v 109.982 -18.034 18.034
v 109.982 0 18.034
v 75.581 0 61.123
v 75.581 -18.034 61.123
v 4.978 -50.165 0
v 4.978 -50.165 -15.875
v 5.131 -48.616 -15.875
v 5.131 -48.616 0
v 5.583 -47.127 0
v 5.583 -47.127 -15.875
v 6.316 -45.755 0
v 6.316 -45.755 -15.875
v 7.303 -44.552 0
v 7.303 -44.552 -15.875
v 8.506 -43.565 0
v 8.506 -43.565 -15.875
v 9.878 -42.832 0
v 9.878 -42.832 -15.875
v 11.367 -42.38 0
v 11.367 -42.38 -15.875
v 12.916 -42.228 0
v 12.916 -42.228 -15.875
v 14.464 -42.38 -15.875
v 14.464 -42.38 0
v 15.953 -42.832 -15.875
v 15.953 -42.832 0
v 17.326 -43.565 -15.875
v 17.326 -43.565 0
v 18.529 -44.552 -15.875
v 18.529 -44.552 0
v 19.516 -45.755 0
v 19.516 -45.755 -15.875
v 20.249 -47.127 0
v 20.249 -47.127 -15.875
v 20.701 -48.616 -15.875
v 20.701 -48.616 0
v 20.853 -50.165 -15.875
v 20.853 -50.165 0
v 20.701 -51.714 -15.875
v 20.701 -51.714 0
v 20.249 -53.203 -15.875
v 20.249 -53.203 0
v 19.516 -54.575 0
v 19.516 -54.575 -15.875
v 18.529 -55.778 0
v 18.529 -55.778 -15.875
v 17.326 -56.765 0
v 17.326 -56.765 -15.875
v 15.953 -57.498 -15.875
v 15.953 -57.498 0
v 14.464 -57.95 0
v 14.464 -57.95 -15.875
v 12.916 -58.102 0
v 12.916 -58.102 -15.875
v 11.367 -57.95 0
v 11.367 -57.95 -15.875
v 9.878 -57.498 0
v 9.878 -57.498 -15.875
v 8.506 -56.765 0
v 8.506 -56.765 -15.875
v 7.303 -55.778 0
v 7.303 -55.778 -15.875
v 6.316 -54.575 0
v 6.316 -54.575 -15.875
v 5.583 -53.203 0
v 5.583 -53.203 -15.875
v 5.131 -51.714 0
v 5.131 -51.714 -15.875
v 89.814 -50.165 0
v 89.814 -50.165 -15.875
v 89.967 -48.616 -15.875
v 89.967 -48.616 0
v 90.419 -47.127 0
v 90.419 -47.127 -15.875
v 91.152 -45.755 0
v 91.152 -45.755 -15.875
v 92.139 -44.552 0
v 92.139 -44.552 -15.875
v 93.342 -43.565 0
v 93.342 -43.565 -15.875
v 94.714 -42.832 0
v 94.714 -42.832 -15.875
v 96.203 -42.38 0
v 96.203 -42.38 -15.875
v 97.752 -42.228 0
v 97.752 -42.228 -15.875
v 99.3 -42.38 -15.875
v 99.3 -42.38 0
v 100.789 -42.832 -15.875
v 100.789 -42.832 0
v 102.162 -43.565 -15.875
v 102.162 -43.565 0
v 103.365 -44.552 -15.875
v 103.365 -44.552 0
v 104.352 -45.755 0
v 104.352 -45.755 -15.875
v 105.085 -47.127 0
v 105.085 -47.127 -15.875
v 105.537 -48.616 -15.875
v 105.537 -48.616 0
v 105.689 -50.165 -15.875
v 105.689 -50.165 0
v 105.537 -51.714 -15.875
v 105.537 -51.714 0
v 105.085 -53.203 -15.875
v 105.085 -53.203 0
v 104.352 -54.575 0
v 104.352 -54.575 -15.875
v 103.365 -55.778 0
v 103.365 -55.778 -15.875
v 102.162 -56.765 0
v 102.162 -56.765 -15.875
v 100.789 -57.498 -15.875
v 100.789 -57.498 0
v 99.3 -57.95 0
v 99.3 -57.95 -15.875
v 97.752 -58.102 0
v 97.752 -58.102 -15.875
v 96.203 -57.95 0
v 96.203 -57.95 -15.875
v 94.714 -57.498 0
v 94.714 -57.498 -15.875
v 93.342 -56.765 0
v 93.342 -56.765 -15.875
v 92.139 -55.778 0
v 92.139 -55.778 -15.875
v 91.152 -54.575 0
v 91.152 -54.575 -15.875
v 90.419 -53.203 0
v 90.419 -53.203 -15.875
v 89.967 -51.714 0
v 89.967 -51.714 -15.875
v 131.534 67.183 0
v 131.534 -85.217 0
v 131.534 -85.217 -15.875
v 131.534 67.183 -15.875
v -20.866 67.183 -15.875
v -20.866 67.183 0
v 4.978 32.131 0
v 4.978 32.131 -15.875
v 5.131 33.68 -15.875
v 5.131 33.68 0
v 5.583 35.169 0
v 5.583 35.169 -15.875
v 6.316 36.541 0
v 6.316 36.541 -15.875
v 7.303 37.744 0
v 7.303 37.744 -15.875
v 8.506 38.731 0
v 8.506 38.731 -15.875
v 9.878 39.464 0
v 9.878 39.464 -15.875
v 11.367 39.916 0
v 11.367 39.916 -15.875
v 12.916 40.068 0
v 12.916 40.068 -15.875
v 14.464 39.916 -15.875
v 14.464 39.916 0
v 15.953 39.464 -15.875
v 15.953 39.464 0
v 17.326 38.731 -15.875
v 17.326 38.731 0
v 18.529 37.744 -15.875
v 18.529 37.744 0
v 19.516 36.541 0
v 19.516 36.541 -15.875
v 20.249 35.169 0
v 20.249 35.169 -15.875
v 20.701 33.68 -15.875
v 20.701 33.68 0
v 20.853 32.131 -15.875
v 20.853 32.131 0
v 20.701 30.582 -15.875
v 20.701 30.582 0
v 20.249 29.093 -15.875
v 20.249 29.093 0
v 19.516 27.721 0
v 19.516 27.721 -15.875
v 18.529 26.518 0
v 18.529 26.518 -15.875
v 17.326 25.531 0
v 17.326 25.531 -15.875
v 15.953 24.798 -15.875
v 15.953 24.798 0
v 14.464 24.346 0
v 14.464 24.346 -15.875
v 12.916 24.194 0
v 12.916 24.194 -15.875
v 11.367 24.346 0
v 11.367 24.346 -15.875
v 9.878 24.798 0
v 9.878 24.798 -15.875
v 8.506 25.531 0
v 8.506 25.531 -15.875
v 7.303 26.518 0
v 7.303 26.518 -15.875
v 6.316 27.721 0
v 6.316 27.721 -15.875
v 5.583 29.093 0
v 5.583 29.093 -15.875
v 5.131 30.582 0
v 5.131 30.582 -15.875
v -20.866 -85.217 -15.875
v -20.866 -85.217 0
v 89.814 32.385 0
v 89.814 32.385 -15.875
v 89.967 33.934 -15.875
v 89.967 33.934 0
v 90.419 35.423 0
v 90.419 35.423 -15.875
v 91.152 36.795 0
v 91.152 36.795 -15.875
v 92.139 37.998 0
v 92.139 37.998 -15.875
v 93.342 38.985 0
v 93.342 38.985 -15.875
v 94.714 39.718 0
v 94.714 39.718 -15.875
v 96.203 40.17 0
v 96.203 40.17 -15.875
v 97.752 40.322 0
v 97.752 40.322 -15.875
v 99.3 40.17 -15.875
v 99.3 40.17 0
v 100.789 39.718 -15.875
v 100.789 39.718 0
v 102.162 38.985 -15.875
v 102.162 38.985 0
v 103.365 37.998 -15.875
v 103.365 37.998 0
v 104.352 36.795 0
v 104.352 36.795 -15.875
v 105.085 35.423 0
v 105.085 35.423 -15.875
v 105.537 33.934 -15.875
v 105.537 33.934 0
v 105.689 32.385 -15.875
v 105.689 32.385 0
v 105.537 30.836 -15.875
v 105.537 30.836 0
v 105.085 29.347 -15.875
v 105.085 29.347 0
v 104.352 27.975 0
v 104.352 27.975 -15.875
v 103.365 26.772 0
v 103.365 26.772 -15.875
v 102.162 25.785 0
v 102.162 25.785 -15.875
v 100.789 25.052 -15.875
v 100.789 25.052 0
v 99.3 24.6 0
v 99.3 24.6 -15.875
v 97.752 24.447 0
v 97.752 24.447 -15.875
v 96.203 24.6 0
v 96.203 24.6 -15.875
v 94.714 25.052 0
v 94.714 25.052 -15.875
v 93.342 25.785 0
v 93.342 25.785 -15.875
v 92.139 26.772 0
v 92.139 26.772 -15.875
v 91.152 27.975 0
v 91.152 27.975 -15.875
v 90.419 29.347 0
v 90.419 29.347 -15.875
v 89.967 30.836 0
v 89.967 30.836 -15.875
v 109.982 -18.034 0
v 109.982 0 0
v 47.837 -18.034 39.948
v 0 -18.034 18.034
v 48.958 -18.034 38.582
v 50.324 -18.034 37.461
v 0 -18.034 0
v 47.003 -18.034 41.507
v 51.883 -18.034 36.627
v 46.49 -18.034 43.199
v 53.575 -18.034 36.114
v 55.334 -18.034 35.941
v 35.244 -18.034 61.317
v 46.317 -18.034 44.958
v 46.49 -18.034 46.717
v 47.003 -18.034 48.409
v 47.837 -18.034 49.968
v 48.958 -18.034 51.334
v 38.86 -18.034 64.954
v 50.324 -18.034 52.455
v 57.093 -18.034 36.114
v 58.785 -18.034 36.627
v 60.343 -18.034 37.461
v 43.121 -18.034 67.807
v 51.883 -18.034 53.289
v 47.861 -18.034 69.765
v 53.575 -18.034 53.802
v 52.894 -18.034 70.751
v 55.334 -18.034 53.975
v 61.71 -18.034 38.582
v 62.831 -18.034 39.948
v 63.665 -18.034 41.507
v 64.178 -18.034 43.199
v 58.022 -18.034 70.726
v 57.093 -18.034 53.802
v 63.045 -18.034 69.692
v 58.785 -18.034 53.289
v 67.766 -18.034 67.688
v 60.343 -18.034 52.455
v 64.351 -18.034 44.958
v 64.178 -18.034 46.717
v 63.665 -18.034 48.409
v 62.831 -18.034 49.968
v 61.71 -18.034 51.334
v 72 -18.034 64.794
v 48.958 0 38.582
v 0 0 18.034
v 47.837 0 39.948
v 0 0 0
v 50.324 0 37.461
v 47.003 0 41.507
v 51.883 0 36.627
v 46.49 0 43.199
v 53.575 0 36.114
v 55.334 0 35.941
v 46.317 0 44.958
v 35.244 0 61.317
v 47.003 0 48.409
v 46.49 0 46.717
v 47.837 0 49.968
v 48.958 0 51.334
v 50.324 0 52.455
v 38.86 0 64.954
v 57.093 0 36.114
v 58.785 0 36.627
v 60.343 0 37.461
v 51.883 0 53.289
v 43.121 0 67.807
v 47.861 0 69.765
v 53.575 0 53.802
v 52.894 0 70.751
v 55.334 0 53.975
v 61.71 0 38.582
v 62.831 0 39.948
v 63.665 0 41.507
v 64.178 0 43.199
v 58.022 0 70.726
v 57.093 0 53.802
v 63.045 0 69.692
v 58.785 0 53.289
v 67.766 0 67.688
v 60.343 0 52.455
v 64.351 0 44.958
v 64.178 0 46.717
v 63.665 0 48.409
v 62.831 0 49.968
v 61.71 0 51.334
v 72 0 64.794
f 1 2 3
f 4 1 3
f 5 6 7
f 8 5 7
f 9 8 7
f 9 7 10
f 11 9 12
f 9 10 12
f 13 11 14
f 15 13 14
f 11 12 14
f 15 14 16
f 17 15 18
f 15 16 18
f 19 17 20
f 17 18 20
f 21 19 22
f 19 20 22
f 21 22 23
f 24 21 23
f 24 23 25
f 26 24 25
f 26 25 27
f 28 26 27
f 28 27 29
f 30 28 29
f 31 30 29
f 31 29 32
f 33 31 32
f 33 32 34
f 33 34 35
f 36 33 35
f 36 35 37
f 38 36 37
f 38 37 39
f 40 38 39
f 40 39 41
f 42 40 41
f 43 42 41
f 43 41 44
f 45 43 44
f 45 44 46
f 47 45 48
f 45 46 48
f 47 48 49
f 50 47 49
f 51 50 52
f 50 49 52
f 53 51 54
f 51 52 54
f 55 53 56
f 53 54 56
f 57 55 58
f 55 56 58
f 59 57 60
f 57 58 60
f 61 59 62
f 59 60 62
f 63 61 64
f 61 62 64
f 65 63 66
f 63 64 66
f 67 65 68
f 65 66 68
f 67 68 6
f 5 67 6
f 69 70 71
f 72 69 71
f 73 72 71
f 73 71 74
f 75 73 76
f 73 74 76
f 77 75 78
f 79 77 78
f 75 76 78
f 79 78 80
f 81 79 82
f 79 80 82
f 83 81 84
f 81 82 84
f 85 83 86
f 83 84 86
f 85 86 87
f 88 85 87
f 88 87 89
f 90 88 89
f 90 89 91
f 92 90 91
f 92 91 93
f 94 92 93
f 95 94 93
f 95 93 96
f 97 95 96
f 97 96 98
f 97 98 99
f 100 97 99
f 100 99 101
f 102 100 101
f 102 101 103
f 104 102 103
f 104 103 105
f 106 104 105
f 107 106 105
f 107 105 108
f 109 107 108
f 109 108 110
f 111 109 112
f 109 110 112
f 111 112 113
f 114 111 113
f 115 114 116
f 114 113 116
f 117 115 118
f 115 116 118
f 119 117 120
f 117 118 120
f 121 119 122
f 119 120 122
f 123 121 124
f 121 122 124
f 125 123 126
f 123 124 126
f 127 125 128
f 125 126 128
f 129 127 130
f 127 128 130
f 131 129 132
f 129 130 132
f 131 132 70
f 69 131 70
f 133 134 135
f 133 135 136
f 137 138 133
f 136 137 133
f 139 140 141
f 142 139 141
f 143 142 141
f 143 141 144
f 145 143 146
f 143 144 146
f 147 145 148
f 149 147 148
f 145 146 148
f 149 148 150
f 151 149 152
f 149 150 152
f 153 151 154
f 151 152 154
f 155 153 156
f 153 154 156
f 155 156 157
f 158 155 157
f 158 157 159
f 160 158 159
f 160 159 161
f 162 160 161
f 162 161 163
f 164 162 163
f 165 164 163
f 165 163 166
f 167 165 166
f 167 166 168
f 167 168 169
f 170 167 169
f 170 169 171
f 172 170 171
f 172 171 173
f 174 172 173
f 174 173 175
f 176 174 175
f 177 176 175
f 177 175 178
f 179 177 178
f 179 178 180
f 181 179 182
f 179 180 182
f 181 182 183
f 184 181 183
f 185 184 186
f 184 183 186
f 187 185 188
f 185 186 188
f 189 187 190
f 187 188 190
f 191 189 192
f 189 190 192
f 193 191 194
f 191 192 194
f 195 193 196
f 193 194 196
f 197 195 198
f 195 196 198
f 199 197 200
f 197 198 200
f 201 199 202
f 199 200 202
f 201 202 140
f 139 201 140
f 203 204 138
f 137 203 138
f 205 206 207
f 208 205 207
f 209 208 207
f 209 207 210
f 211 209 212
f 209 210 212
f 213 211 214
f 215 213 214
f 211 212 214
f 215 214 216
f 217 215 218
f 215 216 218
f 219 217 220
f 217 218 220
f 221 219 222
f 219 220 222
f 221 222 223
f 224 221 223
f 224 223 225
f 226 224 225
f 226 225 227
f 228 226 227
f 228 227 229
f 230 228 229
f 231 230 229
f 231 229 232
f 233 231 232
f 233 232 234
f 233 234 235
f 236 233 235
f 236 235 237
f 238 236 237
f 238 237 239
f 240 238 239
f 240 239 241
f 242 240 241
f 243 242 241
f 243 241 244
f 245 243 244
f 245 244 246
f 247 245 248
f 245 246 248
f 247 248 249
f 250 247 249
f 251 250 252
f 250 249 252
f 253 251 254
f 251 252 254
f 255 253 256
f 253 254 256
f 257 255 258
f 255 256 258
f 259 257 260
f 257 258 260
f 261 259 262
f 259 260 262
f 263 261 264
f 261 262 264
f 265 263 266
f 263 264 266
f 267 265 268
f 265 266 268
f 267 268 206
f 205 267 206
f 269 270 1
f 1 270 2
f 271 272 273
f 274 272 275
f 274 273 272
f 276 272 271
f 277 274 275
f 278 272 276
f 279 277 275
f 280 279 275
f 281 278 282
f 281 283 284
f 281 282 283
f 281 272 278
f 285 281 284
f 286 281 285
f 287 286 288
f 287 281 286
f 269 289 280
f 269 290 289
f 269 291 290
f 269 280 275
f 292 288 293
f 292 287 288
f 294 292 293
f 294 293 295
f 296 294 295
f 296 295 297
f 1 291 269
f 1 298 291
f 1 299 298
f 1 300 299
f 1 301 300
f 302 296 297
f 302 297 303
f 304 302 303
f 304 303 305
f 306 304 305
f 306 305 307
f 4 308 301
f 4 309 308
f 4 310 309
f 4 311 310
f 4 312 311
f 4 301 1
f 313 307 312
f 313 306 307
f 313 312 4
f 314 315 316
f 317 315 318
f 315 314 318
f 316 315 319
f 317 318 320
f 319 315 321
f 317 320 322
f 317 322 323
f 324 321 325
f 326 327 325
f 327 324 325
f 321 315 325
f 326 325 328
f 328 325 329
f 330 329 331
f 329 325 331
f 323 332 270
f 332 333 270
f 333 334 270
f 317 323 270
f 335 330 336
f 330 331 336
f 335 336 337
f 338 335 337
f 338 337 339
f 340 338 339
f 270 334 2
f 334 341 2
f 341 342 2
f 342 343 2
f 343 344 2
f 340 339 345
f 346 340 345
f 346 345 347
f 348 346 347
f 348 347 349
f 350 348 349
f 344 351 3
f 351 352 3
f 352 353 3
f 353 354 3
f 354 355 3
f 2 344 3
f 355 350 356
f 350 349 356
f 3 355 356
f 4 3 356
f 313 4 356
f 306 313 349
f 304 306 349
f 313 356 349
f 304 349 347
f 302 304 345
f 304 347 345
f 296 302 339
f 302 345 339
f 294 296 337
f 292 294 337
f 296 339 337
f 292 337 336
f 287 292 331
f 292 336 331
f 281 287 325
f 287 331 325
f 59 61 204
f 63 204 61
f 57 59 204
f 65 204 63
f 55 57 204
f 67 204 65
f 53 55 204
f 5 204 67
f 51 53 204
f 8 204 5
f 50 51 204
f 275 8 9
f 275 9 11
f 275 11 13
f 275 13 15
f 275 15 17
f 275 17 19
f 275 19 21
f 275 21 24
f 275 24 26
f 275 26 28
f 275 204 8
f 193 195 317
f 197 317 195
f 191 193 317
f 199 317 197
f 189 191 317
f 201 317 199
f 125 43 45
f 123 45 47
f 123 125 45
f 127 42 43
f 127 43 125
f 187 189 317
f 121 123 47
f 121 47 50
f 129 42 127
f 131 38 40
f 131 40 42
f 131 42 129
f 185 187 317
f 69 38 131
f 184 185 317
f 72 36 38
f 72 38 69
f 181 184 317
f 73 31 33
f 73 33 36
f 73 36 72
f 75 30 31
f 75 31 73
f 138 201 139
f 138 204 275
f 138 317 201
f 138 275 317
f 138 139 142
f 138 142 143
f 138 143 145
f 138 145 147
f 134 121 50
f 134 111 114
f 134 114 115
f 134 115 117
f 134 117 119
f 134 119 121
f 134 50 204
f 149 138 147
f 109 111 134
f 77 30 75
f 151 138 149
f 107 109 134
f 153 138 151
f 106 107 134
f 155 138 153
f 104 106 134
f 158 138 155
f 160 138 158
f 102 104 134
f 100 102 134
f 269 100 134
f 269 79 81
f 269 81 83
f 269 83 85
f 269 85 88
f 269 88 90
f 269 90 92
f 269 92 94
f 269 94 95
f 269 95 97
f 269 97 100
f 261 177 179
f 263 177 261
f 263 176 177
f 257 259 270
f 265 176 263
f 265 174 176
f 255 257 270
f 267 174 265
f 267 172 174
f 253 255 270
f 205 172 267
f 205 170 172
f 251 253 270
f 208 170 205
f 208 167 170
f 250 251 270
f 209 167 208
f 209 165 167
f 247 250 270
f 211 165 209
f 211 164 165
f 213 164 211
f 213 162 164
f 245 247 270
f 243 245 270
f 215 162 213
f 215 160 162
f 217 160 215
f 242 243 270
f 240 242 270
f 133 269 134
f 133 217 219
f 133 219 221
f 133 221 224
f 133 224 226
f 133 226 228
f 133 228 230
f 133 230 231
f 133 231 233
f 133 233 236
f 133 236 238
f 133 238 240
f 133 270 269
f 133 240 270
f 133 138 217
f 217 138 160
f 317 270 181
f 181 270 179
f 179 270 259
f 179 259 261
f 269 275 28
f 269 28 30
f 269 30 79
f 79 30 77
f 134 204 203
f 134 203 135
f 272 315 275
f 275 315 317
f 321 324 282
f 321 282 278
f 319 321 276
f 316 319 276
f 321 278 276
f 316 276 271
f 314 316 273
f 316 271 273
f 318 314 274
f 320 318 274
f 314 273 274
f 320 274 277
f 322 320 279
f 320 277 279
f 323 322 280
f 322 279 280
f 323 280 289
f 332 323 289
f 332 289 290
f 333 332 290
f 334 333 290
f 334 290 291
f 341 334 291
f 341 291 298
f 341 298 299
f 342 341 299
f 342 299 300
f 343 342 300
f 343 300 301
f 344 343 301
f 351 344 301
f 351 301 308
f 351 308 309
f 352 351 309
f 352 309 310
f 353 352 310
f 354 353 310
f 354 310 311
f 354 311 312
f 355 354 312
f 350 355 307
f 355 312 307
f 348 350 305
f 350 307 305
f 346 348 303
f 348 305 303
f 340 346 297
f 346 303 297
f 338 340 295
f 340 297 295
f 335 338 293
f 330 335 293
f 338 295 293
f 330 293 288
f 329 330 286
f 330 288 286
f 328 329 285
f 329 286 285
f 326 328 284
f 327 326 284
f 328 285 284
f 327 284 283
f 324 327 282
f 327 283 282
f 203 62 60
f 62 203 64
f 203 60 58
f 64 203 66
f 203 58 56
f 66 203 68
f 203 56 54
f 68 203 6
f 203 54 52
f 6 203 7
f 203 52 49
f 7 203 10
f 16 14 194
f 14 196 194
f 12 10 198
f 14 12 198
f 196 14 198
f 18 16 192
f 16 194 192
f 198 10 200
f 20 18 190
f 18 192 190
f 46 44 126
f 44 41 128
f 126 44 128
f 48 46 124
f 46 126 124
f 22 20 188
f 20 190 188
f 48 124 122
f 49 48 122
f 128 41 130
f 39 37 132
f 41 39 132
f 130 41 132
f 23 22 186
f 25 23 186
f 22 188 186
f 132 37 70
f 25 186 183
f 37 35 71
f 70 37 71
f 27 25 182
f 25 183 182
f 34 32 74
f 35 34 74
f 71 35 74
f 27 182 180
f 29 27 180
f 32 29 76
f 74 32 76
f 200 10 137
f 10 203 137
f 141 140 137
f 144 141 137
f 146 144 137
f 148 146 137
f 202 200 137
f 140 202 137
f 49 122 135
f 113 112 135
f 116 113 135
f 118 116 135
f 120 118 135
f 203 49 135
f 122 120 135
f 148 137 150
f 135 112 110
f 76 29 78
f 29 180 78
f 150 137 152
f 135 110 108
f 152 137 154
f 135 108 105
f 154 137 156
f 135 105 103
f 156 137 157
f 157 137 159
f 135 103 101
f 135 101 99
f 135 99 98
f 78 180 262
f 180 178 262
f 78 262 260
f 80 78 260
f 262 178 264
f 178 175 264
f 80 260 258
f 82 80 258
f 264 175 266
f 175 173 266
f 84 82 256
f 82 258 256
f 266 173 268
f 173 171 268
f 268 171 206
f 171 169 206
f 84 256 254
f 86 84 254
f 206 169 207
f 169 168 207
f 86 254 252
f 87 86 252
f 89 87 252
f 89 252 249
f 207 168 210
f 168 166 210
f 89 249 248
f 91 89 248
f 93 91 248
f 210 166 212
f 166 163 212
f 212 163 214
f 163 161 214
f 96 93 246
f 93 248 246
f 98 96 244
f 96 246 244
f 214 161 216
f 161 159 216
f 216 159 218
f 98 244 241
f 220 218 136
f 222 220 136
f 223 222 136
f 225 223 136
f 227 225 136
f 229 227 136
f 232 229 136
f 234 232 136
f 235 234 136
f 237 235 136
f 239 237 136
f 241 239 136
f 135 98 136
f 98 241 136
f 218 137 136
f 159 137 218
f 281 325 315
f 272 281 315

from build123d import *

# Parameters (mm, degrees)
F1_DEPTH = 18.034
F2_W     = 152.4
F2_H     = 152.4
F3_DEPTH = 15.875
F4_D     = 18.034
F5_D     = 15.875


with BuildPart() as f1:
    # F0 (on Front) → F1 (new body)
    with BuildSketch(Plane.XZ):
        with BuildLine():
            Line((0, 18.034), (0, 0))
            Line((0, 0), (109.982, 0))
            Line((109.982, 0), (109.982, 18.034))
            Line((109.982, 18.034), (75.5805723786, 61.1226751156))
            ThreePointArc((75.5805723786, 61.1226751156), (55.4585614287, 70.8657000818), (35.2437223557, 61.316766036))
            Line((35.2437223557, 61.316766036), (0, 18.034))
        make_face()
    extrude(amount=F1_DEPTH)

    # F2 (on Top) → F3 (join)
    with BuildSketch(Plane.XY):
        with Locations((55.3339, -9.017)):
            Rectangle(F2_W, F2_H)
    extrude(amount=-F3_DEPTH)

    # F4 (through all)
    with Locations(Plane(origin=(0, 0, 0), x_dir=(1, 0, 0), z_dir=(0, 1, 0))):
        with Locations((55.3339, -44.958)):
            Hole(F4_D / 2)

    # F5 (through all)
    with Locations(Plane.XY):
        with Locations((97.7519, -50.165), (12.9159, -50.165), (12.9159, 32.131), (97.7519, 32.385)):
            Hole(F5_D / 2)


solid = f1.part
